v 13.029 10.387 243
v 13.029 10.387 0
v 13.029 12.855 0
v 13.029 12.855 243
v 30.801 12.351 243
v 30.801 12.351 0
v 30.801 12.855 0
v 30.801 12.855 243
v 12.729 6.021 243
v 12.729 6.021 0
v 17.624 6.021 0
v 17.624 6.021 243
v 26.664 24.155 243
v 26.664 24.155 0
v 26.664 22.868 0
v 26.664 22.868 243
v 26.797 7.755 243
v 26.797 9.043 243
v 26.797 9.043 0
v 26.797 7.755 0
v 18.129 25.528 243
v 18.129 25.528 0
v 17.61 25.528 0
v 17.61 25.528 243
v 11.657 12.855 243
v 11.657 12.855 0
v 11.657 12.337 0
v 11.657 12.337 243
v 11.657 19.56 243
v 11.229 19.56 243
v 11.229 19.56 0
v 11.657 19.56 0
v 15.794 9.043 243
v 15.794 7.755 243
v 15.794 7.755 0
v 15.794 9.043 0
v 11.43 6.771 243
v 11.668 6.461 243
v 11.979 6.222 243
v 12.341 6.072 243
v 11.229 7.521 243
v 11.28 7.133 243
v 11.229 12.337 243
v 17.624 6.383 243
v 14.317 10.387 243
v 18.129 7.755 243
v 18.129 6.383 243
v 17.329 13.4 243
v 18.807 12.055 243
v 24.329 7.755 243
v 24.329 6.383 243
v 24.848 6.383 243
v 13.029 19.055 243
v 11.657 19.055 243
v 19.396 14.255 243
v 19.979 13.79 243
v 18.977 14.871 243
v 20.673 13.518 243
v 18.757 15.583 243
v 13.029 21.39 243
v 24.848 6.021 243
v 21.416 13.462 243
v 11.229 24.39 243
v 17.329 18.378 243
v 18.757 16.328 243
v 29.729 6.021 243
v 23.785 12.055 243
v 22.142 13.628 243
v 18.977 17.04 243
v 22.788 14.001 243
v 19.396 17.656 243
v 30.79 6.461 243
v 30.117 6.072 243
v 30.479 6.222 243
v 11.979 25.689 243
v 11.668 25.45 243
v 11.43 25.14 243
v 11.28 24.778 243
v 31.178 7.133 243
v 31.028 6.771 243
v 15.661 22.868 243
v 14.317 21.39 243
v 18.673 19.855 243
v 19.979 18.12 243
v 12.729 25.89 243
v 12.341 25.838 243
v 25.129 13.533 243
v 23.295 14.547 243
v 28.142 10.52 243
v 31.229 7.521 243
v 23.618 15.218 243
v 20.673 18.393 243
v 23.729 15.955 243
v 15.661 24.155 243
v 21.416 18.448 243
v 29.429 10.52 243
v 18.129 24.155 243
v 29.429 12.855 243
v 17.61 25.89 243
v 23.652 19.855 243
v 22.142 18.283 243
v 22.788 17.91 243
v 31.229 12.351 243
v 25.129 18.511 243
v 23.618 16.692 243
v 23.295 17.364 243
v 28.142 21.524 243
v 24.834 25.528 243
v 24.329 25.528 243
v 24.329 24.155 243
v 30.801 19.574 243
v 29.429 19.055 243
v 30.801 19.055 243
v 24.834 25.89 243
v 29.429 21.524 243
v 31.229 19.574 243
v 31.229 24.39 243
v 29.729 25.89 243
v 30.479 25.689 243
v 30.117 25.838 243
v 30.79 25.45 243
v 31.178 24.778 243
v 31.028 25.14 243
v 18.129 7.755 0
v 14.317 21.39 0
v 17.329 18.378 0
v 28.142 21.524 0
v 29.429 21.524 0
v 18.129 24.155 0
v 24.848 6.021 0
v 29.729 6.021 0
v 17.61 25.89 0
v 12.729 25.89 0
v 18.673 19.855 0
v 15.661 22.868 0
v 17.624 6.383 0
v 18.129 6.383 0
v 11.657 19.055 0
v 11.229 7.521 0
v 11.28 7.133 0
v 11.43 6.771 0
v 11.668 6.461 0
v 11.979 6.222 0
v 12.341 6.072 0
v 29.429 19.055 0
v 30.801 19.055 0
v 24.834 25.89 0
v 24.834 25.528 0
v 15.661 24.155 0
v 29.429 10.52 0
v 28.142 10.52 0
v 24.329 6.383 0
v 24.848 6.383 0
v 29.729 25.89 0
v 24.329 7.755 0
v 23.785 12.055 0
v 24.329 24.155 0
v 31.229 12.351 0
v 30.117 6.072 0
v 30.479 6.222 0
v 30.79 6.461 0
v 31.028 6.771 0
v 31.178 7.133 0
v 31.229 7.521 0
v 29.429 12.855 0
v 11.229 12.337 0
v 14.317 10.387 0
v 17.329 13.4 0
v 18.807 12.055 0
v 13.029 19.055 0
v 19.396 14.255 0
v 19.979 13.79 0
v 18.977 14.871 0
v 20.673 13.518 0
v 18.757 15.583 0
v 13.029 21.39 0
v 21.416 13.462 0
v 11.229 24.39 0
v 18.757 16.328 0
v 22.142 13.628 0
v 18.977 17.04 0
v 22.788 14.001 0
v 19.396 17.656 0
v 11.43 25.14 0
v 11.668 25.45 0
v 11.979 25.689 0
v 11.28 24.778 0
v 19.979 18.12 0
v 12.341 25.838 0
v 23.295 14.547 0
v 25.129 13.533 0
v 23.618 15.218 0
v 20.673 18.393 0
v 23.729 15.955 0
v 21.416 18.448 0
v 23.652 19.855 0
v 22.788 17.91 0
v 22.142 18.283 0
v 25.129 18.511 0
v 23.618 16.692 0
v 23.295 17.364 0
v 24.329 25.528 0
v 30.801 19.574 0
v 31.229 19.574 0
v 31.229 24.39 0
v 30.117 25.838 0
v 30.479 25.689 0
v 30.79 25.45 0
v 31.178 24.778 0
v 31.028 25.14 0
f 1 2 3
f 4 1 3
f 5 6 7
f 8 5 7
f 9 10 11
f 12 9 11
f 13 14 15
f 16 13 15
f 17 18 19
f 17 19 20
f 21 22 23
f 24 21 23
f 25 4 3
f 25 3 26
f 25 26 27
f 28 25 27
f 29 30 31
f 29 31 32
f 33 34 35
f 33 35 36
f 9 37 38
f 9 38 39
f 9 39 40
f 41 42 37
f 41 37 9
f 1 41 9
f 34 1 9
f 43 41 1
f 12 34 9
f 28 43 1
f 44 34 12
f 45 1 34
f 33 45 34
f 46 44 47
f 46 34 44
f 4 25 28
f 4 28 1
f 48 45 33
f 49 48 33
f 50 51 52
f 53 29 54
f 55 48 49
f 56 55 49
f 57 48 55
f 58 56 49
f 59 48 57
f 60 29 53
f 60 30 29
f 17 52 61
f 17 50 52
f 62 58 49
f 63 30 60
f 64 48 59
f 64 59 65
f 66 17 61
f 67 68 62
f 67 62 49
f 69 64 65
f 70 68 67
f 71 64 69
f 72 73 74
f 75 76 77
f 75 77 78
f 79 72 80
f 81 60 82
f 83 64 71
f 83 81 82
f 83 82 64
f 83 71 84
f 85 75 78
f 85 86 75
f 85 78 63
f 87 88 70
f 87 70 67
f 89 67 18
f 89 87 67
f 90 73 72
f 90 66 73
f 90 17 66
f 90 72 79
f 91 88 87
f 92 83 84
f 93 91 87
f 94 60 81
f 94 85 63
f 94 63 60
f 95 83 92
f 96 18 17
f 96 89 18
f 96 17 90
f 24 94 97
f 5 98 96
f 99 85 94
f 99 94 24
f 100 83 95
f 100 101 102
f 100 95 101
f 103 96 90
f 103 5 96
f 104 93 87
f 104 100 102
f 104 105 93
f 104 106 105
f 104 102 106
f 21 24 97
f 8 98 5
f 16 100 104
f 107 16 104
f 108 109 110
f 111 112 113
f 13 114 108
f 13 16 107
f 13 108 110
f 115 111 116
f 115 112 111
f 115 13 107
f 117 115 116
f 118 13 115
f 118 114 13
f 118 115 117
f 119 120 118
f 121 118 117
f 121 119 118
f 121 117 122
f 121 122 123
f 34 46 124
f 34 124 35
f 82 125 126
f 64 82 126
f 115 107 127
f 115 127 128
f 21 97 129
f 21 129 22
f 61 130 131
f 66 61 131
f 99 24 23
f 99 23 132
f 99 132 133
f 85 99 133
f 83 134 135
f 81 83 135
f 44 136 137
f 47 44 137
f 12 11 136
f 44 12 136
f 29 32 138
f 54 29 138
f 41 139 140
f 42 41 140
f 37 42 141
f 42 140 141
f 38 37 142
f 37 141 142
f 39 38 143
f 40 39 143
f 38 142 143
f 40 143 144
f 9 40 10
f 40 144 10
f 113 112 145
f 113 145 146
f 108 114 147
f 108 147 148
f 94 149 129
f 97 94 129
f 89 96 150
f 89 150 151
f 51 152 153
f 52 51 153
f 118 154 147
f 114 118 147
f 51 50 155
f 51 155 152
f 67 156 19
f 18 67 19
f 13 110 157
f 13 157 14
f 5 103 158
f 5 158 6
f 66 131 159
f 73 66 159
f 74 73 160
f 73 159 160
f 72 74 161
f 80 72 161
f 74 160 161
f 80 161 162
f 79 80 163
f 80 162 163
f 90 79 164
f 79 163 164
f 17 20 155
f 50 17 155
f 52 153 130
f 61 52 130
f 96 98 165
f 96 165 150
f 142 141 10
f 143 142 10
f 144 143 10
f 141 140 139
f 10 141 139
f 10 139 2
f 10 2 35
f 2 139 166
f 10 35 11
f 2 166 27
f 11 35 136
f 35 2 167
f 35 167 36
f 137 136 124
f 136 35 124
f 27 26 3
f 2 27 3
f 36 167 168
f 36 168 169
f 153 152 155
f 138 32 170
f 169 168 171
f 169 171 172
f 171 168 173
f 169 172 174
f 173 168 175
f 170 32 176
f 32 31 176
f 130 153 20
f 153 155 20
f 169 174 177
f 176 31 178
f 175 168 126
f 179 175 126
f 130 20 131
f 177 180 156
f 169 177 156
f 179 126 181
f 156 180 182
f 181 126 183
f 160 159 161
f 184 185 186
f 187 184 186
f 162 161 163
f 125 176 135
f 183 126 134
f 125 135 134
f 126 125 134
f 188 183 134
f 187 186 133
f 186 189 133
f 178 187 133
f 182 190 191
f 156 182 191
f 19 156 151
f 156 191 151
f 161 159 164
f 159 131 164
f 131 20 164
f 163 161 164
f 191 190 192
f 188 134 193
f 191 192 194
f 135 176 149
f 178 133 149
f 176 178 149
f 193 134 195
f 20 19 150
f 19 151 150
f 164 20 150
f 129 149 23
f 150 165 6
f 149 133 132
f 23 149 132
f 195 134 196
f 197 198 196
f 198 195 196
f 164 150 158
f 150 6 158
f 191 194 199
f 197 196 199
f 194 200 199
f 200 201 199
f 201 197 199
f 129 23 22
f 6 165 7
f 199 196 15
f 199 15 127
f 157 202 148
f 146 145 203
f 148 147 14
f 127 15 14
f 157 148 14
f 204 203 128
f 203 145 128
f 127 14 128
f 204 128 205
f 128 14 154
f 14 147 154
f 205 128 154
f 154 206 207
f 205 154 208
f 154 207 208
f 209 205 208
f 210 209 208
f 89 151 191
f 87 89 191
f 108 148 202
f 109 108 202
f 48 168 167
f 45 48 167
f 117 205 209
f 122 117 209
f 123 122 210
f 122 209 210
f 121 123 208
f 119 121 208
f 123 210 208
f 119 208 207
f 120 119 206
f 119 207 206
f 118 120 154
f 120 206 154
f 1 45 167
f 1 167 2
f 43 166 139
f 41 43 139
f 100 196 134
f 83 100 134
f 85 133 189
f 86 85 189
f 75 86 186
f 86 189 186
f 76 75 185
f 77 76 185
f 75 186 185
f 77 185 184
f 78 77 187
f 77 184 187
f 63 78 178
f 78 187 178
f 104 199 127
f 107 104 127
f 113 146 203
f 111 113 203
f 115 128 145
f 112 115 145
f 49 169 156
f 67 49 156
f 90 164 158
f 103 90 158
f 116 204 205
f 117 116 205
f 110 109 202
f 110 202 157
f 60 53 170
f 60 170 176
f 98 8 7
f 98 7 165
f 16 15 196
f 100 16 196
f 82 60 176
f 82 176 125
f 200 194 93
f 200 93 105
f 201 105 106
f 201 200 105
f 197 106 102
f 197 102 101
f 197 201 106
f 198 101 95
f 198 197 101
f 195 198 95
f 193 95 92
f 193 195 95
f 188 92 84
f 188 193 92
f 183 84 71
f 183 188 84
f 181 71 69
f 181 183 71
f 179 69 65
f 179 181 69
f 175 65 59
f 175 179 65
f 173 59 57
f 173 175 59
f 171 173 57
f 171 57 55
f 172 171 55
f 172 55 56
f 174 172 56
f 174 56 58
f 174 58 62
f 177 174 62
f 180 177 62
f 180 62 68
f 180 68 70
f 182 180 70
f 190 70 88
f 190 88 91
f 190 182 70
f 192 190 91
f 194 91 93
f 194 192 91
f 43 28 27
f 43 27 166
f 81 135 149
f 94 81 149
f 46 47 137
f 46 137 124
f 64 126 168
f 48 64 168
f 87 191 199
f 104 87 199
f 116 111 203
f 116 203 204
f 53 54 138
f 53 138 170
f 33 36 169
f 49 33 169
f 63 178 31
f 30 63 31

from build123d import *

# Parameters (mm, degrees)
SKETCH1_R           = 2.5
BOSS_EXTRUDE1_DEPTH = 243


with BuildPart() as part:
    # Sketch1 → Boss-Extrude1 (new body)
    with BuildSketch(Plane.XY):
        with BuildLine():
            Line((14.316619525, 10.387216168), (13.029112559, 10.387216168))
            Line((13.029112559, 10.387216168), (13.029112559, 12.855371932))
            Line((13.029112559, 12.855371932), (11.656738465, 12.855371932))
            Line((11.656738465, 12.855371932), (11.656738465, 12.336659272))
            Line((11.656738465, 12.336659272), (11.229112559, 12.336659272))
            Line((11.229112559, 12.336659272), (11.229112559, 7.521203168))
            ThreePointArc((11.229112559, 7.521203168), (11.668452387, 6.460542996), (12.729112559, 6.021203168))
            Line((12.729112559, 6.021203168), (17.624436699, 6.021203168))
            Line((17.624436699, 6.021203168), (17.624436699, 6.382997838))
            Line((17.624436699, 6.382997838), (18.129112559, 6.382997838))
            Line((18.129112559, 6.382997838), (18.129112559, 7.755371932))
            Line((18.129112559, 7.755371932), (15.794230869, 7.755371932))
            Line((15.794230869, 7.755371932), (15.794230869, 9.042878898))
            Line((15.794230869, 9.042878898), (18.806723903, 12.055371932))
            Line((18.806723903, 12.055371932), (23.784775289, 12.055371932))
            Line((23.784775289, 12.055371932), (26.797268323, 9.042878898))
            Line((26.797268323, 9.042878898), (26.797268323, 7.755371932))
            Line((26.797268323, 7.755371932), (24.329112559, 7.755371932))
            Line((24.329112559, 7.755371932), (24.329112559, 6.382997838))
            Line((24.329112559, 6.382997838), (24.847825219, 6.382997838))
            Line((24.847825219, 6.382997838), (24.847825219, 6.021203168))
            Line((24.847825219, 6.021203168), (29.729112559, 6.021203168))
            ThreePointArc((29.729112559, 6.021203168), (30.789772731, 6.460542996), (31.229112559, 7.521203168))
            Line((31.229112559, 7.521203168), (31.229112559, 12.350696072))
            Line((31.229112559, 12.350696072), (30.801486653, 12.350696072))
            Line((30.801486653, 12.350696072), (30.801486653, 12.855371932))
            Line((30.801486653, 12.855371932), (29.429112559, 12.855371932))
            Line((29.429112559, 12.855371932), (29.429112559, 10.520490242))
            Line((29.429112559, 10.520490242), (28.141605593, 10.520490242))
            Line((28.141605593, 10.520490242), (25.129112559, 13.532983276))
            Line((25.129112559, 13.532983276), (25.129112559, 18.511034662))
            Line((25.129112559, 18.511034662), (28.141605593, 21.523527696))
            Line((28.141605593, 21.523527696), (29.429112559, 21.523527696))
            Line((29.429112559, 21.523527696), (29.429112559, 19.055371932))
            Line((29.429112559, 19.055371932), (30.801486653, 19.055371932))
            Line((30.801486653, 19.055371932), (30.801486653, 19.574084592))
            Line((30.801486653, 19.574084592), (31.229112559, 19.574084592))
            Line((31.229112559, 19.574084592), (31.229112559, 24.389540696))
            ThreePointArc((31.229112559, 24.389540696), (30.789772731, 25.450200868), (29.729112559, 25.889540696))
            Line((29.729112559, 25.889540696), (24.833788419, 25.889540696))
            Line((24.833788419, 25.889540696), (24.833788419, 25.527746026))
            Line((24.833788419, 25.527746026), (24.329112559, 25.527746026))
            Line((24.329112559, 25.527746026), (24.329112559, 24.155371932))
            Line((24.329112559, 24.155371932), (26.663994249, 24.155371932))
            Line((26.663994249, 24.155371932), (26.663994249, 22.867864966))
            Line((26.663994249, 22.867864966), (23.651501215, 19.855371932))
            Line((23.651501215, 19.855371932), (18.673449829, 19.855371932))
            Line((18.673449829, 19.855371932), (15.660956795, 22.867864966))
            Line((15.660956795, 22.867864966), (15.660956795, 24.155371932))
            Line((15.660956795, 24.155371932), (18.129112559, 24.155371932))
            Line((18.129112559, 24.155371932), (18.129112559, 25.527746026))
            Line((18.129112559, 25.527746026), (17.610399899, 25.527746026))
            Line((17.610399899, 25.527746026), (17.610399899, 25.889540696))
            Line((17.610399899, 25.889540696), (12.729112559, 25.889540696))
            ThreePointArc((12.729112559, 25.889540696), (11.668452387, 25.450200868), (11.229112559, 24.389540696))
            Line((11.229112559, 24.389540696), (11.229112559, 19.560047792))
            Line((11.229112559, 19.560047792), (11.656738465, 19.560047792))
            Line((11.656738465, 19.560047792), (11.656738465, 19.055371932))
            Line((11.656738465, 19.055371932), (13.029112559, 19.055371932))
            Line((13.029112559, 19.055371932), (13.029112559, 21.390253622))
            Line((13.029112559, 21.390253622), (14.316619525, 21.390253622))
            Line((14.316619525, 21.390253622), (17.329112559, 18.377760588))
            Line((17.329112559, 18.377760588), (17.329112559, 13.399709202))
            Line((17.329112559, 13.399709202), (14.316619525, 10.387216168))
        make_face()
        with Locations((21.229112559, 15.955371932)):
            Circle(SKETCH1_R, mode=Mode.SUBTRACT)
    extrude(amount=BOSS_EXTRUDE1_DEPTH)


solid = part.part
